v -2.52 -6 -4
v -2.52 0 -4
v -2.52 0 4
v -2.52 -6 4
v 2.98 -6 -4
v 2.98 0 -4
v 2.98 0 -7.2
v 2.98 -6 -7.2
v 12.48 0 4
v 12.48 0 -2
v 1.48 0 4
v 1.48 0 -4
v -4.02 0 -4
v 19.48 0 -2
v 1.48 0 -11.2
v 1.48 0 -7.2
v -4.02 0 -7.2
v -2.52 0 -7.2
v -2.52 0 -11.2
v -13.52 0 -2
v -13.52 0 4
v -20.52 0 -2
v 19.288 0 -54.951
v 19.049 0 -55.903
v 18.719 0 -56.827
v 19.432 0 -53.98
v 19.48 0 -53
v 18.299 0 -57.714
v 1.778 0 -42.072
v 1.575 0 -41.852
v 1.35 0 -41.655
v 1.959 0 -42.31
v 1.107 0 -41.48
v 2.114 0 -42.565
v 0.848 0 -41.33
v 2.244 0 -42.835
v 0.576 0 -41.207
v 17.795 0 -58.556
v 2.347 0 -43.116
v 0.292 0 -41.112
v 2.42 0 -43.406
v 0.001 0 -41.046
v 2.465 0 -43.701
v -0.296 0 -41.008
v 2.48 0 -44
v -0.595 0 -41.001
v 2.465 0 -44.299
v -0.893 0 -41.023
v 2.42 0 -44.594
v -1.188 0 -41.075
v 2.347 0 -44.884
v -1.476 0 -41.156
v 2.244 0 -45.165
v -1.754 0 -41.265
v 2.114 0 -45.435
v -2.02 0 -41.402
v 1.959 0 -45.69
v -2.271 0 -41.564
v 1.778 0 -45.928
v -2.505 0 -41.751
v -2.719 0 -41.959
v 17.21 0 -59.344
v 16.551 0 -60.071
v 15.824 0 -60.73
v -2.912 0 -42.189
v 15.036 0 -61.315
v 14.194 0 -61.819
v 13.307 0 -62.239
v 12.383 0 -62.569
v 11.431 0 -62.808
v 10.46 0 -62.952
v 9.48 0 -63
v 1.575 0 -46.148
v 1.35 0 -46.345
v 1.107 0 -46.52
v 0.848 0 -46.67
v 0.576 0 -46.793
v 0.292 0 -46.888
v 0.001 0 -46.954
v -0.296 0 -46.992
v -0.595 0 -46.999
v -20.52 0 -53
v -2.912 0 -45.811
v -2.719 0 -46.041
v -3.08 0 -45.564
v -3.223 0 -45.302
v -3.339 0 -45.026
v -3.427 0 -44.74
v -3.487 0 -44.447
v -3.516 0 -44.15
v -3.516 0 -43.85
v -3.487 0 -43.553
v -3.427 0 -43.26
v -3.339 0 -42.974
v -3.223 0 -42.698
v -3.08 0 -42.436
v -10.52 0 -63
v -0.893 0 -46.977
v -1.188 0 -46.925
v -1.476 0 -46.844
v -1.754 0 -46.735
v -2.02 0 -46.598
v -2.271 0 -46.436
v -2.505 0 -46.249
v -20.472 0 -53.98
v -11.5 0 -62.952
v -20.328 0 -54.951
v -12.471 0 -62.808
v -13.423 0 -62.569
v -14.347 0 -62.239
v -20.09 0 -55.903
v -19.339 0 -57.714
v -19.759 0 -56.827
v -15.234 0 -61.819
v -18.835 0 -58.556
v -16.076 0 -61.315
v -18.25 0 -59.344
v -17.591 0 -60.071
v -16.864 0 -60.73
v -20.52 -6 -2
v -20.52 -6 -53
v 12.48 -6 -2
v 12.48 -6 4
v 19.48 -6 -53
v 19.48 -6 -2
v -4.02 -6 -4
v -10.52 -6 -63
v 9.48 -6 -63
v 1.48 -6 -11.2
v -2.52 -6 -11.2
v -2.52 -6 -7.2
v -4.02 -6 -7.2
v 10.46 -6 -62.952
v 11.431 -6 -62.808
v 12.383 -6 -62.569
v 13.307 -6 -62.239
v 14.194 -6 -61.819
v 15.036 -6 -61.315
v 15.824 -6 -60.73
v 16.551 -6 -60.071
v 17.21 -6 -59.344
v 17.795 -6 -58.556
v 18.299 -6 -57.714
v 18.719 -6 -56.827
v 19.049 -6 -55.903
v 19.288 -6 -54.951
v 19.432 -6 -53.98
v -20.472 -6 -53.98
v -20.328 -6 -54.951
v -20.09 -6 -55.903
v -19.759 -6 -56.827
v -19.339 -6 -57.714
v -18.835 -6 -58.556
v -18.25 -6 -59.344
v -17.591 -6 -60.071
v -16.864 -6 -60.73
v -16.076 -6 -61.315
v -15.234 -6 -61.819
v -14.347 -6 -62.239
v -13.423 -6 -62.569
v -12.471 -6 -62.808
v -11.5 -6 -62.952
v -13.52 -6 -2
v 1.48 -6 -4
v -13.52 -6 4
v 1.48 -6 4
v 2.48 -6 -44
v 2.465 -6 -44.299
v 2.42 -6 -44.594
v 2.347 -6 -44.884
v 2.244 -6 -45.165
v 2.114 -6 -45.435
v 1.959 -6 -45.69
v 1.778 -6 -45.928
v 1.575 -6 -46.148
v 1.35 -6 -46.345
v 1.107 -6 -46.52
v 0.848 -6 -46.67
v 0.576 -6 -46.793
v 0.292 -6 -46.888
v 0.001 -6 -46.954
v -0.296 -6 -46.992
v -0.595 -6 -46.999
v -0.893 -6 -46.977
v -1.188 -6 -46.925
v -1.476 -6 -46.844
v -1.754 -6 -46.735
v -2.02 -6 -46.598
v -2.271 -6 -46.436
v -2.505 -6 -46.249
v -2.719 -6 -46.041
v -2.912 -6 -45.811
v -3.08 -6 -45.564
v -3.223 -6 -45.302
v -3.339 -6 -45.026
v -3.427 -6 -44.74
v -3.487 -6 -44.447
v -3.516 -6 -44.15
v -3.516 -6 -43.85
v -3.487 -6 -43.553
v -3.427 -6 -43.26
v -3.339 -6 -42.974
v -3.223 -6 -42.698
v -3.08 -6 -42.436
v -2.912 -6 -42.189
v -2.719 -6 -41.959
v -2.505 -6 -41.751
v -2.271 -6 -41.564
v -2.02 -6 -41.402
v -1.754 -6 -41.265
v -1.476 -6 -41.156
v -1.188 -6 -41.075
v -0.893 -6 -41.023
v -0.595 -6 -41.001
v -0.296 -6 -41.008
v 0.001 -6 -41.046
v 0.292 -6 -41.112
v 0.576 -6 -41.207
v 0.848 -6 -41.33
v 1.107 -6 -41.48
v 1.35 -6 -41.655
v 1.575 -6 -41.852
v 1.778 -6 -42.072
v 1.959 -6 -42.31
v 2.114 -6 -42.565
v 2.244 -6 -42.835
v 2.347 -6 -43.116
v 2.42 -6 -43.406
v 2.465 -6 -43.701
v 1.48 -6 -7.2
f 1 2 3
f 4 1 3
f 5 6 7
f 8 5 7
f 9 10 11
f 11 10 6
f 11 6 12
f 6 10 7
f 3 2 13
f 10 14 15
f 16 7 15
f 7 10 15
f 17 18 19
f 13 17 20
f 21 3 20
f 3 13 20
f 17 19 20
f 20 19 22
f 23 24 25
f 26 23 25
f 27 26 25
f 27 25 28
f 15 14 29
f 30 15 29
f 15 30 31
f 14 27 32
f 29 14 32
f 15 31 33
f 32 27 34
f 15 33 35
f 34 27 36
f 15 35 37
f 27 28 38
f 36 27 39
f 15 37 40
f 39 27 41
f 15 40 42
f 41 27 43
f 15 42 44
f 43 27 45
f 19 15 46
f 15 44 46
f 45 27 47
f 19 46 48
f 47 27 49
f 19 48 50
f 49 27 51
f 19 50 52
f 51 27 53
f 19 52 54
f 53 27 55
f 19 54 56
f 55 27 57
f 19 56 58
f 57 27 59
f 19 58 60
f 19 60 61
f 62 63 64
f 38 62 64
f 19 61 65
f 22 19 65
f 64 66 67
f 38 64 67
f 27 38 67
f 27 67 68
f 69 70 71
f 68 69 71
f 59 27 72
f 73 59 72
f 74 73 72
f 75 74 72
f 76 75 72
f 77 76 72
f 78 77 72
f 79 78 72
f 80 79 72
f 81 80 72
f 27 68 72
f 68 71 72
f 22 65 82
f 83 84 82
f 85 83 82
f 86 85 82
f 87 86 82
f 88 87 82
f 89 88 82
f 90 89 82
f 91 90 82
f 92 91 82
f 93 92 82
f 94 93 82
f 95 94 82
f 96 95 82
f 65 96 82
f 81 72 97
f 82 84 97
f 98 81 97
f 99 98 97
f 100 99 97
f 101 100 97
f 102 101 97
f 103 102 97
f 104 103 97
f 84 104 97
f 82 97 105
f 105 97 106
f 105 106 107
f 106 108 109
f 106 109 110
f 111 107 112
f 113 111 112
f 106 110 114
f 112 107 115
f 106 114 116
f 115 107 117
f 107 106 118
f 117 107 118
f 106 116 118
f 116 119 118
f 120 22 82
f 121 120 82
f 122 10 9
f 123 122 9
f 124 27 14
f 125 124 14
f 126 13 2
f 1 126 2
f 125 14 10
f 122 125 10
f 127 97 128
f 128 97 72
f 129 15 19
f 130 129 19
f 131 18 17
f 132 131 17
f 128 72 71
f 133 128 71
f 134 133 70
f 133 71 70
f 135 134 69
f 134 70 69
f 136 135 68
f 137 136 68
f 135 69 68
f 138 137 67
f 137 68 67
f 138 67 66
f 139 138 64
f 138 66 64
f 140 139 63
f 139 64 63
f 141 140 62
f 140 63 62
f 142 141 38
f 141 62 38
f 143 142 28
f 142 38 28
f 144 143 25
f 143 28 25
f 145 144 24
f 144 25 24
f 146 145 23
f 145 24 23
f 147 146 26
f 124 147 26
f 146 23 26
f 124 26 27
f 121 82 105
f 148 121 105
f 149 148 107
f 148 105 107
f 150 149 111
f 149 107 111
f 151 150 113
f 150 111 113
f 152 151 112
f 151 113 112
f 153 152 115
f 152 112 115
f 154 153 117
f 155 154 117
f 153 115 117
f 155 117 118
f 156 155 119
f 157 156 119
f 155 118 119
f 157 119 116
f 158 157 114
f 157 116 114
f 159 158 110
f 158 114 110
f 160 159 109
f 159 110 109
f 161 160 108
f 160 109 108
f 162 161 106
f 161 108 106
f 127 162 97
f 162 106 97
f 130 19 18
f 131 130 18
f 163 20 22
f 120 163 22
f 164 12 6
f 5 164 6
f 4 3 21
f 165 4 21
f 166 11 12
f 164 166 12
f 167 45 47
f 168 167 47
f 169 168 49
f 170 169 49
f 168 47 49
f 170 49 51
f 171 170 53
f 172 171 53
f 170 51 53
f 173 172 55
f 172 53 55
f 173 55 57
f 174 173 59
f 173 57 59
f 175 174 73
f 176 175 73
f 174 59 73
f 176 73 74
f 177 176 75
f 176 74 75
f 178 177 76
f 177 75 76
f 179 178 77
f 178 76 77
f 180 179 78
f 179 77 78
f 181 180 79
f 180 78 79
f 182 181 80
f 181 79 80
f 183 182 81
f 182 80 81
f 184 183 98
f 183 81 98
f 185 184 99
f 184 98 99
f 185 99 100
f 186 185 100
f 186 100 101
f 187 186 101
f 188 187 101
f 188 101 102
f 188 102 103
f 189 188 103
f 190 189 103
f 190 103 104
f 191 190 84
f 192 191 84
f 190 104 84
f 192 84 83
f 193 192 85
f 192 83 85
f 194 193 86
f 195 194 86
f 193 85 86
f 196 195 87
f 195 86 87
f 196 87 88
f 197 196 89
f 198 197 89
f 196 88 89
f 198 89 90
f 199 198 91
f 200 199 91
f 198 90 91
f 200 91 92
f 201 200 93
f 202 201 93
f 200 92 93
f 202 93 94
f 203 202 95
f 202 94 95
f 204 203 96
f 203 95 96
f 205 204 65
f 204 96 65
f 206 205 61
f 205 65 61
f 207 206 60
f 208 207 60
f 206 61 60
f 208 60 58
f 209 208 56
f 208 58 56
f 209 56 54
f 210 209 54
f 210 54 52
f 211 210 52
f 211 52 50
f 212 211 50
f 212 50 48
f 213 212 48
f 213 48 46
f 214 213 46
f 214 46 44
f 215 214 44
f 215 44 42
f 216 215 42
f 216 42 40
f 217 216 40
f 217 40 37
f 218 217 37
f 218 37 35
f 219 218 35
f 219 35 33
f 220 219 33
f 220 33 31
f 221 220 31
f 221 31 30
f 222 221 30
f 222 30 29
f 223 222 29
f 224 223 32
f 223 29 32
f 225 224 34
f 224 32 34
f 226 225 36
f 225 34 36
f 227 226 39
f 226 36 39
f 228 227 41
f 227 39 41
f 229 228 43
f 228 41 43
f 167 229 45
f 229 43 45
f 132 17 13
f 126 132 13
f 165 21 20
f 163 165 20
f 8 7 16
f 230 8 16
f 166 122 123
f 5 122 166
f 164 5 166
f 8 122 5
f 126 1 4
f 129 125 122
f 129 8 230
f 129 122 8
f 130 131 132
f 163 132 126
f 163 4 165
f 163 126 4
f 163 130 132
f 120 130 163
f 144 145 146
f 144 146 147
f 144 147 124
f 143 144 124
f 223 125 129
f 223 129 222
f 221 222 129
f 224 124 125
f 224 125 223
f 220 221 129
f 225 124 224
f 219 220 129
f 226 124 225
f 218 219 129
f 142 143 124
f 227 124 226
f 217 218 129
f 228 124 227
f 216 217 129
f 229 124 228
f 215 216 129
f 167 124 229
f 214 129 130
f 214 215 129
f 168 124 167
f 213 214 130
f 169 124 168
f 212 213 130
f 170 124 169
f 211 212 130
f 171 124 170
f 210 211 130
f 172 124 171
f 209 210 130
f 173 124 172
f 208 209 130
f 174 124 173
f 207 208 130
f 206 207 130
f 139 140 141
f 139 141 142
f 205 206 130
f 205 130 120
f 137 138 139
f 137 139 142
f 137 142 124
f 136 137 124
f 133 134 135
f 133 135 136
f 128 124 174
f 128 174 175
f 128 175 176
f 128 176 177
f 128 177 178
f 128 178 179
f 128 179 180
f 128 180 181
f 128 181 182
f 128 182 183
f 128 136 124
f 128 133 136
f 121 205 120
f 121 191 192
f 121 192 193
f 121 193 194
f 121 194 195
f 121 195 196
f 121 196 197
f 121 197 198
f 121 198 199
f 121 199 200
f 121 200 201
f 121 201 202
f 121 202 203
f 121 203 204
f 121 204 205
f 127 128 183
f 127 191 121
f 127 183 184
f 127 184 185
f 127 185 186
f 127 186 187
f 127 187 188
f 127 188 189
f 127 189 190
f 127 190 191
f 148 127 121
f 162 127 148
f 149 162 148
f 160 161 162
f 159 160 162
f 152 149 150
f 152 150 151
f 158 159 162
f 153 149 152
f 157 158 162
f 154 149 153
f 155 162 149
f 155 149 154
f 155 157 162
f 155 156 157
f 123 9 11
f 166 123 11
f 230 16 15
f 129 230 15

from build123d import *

# Parameters (mm, degrees)
SKETCH1_R           = 3
BOSS_EXTRUDE2_DEPTH = 6


with BuildPart() as part:
    # Sketch1 → Boss-Extrude2 (new body)
    with BuildSketch(Plane(origin=(0, 0, 0), x_dir=(1, 0, 0), z_dir=(0, 1, 0))):
        with BuildLine():
            Line((-10.520184167, 63), (9.479815833, 63))
            ThreePointArc((9.479815833, 63), (16.550883645, 60.071067812), (19.479815833, 53))
            Line((19.479815833, 53), (19.479815833, 2))
            Line((19.479815833, 2), (12.479815833, 2))
            Line((12.479815833, 2), (12.479815833, -4))
            Line((12.479815833, -4), (1.479815833, -4))
            Line((1.479815833, -4), (1.479815833, 4))
            Line((1.479815833, 4), (2.979815833, 4))
            Line((2.979815833, 4), (2.979815833, 7.2))
            Line((2.979815833, 7.2), (1.479815833, 7.2))
            Line((1.479815833, 7.2), (1.479815833, 11.2))
            Line((1.479815833, 11.2), (-2.520184167, 11.2))
            Line((-2.520184167, 11.2), (-2.520184167, 7.2))
            Line((-2.520184167, 7.2), (-4.020184167, 7.2))
            Line((-4.020184167, 7.2), (-4.020184167, 4))
            Line((-4.020184167, 4), (-2.520184167, 4))
            Line((-2.520184167, 4), (-2.520184167, -4))
            Line((-2.520184167, -4), (-13.520184167, -4))
            Line((-13.520184167, -4), (-13.520184167, 2))
            Line((-13.520184167, 2), (-20.520184167, 2))
            Line((-20.520184167, 2), (-20.520184167, 53))
            ThreePointArc((-20.520184167, 53), (-17.591251979, 60.071067812), (-10.520184167, 63))
        make_face()
        with Locations((-0.520184167, 44)):
            Circle(SKETCH1_R, mode=Mode.SUBTRACT)
    extrude(amount=-BOSS_EXTRUDE2_DEPTH)


solid = part.part
